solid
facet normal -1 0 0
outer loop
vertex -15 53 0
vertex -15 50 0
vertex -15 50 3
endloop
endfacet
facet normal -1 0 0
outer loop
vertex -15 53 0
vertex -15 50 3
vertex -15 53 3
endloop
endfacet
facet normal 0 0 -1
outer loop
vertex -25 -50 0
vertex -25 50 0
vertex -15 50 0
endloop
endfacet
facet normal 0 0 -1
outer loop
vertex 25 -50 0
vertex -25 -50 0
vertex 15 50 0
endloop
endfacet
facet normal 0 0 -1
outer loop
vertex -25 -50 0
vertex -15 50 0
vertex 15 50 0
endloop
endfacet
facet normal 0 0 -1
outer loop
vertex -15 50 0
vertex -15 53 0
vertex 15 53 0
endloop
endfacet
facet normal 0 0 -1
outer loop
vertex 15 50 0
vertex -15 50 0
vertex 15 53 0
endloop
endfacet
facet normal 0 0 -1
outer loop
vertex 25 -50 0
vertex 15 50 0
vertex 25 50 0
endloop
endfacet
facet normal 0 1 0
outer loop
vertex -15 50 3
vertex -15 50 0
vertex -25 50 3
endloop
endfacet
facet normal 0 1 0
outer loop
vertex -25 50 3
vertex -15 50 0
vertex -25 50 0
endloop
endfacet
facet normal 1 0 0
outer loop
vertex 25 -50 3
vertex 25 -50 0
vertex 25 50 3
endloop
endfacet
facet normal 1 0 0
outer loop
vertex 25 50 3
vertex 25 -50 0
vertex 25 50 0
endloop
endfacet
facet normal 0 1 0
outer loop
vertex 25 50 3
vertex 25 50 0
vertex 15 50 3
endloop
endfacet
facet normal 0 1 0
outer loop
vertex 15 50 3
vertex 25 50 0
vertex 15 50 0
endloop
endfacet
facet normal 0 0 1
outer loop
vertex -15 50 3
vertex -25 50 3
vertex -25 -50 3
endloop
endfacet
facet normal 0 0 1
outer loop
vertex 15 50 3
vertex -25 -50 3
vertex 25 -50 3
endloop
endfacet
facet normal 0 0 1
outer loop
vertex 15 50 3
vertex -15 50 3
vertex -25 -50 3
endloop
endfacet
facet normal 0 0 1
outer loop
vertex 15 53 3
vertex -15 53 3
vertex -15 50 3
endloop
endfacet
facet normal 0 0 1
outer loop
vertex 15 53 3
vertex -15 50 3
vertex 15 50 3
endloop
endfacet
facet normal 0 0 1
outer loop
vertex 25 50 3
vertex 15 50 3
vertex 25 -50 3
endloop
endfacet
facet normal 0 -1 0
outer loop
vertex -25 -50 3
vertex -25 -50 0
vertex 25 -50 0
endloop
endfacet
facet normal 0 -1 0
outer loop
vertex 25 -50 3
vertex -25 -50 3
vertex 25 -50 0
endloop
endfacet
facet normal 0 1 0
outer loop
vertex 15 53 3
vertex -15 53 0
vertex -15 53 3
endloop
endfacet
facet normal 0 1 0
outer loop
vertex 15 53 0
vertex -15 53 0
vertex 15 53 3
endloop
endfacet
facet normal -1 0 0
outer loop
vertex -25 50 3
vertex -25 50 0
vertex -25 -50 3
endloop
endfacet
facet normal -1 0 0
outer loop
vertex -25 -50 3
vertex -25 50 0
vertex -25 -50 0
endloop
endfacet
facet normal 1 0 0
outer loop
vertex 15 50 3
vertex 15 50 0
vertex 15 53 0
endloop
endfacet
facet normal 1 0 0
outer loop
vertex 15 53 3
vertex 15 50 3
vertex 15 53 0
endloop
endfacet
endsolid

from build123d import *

# Parameters (mm, degrees)
SKETCH_1_W      = 30
SKETCH_1_H      = 3
EXTRUDE_1_DEPTH = 3


with BuildPart() as part:
    # Эскиз1 → Бобышка-Вытянуть1 (new body)
    with BuildSketch(Plane.XY):
        Polygon((-25, 50), (-25, -50), (25, -50), (25, 50), (15, 50), (15, 47), (-15, 47), (-15, 50), align=None)
        with Locations((0, 48.5)):
            Rectangle(SKETCH_1_W, SKETCH_1_H)
        with Locations((0, 51.5)):
            Rectangle(SKETCH_1_W, SKETCH_1_H)
    extrude(amount=EXTRUDE_1_DEPTH)


solid = part.part
